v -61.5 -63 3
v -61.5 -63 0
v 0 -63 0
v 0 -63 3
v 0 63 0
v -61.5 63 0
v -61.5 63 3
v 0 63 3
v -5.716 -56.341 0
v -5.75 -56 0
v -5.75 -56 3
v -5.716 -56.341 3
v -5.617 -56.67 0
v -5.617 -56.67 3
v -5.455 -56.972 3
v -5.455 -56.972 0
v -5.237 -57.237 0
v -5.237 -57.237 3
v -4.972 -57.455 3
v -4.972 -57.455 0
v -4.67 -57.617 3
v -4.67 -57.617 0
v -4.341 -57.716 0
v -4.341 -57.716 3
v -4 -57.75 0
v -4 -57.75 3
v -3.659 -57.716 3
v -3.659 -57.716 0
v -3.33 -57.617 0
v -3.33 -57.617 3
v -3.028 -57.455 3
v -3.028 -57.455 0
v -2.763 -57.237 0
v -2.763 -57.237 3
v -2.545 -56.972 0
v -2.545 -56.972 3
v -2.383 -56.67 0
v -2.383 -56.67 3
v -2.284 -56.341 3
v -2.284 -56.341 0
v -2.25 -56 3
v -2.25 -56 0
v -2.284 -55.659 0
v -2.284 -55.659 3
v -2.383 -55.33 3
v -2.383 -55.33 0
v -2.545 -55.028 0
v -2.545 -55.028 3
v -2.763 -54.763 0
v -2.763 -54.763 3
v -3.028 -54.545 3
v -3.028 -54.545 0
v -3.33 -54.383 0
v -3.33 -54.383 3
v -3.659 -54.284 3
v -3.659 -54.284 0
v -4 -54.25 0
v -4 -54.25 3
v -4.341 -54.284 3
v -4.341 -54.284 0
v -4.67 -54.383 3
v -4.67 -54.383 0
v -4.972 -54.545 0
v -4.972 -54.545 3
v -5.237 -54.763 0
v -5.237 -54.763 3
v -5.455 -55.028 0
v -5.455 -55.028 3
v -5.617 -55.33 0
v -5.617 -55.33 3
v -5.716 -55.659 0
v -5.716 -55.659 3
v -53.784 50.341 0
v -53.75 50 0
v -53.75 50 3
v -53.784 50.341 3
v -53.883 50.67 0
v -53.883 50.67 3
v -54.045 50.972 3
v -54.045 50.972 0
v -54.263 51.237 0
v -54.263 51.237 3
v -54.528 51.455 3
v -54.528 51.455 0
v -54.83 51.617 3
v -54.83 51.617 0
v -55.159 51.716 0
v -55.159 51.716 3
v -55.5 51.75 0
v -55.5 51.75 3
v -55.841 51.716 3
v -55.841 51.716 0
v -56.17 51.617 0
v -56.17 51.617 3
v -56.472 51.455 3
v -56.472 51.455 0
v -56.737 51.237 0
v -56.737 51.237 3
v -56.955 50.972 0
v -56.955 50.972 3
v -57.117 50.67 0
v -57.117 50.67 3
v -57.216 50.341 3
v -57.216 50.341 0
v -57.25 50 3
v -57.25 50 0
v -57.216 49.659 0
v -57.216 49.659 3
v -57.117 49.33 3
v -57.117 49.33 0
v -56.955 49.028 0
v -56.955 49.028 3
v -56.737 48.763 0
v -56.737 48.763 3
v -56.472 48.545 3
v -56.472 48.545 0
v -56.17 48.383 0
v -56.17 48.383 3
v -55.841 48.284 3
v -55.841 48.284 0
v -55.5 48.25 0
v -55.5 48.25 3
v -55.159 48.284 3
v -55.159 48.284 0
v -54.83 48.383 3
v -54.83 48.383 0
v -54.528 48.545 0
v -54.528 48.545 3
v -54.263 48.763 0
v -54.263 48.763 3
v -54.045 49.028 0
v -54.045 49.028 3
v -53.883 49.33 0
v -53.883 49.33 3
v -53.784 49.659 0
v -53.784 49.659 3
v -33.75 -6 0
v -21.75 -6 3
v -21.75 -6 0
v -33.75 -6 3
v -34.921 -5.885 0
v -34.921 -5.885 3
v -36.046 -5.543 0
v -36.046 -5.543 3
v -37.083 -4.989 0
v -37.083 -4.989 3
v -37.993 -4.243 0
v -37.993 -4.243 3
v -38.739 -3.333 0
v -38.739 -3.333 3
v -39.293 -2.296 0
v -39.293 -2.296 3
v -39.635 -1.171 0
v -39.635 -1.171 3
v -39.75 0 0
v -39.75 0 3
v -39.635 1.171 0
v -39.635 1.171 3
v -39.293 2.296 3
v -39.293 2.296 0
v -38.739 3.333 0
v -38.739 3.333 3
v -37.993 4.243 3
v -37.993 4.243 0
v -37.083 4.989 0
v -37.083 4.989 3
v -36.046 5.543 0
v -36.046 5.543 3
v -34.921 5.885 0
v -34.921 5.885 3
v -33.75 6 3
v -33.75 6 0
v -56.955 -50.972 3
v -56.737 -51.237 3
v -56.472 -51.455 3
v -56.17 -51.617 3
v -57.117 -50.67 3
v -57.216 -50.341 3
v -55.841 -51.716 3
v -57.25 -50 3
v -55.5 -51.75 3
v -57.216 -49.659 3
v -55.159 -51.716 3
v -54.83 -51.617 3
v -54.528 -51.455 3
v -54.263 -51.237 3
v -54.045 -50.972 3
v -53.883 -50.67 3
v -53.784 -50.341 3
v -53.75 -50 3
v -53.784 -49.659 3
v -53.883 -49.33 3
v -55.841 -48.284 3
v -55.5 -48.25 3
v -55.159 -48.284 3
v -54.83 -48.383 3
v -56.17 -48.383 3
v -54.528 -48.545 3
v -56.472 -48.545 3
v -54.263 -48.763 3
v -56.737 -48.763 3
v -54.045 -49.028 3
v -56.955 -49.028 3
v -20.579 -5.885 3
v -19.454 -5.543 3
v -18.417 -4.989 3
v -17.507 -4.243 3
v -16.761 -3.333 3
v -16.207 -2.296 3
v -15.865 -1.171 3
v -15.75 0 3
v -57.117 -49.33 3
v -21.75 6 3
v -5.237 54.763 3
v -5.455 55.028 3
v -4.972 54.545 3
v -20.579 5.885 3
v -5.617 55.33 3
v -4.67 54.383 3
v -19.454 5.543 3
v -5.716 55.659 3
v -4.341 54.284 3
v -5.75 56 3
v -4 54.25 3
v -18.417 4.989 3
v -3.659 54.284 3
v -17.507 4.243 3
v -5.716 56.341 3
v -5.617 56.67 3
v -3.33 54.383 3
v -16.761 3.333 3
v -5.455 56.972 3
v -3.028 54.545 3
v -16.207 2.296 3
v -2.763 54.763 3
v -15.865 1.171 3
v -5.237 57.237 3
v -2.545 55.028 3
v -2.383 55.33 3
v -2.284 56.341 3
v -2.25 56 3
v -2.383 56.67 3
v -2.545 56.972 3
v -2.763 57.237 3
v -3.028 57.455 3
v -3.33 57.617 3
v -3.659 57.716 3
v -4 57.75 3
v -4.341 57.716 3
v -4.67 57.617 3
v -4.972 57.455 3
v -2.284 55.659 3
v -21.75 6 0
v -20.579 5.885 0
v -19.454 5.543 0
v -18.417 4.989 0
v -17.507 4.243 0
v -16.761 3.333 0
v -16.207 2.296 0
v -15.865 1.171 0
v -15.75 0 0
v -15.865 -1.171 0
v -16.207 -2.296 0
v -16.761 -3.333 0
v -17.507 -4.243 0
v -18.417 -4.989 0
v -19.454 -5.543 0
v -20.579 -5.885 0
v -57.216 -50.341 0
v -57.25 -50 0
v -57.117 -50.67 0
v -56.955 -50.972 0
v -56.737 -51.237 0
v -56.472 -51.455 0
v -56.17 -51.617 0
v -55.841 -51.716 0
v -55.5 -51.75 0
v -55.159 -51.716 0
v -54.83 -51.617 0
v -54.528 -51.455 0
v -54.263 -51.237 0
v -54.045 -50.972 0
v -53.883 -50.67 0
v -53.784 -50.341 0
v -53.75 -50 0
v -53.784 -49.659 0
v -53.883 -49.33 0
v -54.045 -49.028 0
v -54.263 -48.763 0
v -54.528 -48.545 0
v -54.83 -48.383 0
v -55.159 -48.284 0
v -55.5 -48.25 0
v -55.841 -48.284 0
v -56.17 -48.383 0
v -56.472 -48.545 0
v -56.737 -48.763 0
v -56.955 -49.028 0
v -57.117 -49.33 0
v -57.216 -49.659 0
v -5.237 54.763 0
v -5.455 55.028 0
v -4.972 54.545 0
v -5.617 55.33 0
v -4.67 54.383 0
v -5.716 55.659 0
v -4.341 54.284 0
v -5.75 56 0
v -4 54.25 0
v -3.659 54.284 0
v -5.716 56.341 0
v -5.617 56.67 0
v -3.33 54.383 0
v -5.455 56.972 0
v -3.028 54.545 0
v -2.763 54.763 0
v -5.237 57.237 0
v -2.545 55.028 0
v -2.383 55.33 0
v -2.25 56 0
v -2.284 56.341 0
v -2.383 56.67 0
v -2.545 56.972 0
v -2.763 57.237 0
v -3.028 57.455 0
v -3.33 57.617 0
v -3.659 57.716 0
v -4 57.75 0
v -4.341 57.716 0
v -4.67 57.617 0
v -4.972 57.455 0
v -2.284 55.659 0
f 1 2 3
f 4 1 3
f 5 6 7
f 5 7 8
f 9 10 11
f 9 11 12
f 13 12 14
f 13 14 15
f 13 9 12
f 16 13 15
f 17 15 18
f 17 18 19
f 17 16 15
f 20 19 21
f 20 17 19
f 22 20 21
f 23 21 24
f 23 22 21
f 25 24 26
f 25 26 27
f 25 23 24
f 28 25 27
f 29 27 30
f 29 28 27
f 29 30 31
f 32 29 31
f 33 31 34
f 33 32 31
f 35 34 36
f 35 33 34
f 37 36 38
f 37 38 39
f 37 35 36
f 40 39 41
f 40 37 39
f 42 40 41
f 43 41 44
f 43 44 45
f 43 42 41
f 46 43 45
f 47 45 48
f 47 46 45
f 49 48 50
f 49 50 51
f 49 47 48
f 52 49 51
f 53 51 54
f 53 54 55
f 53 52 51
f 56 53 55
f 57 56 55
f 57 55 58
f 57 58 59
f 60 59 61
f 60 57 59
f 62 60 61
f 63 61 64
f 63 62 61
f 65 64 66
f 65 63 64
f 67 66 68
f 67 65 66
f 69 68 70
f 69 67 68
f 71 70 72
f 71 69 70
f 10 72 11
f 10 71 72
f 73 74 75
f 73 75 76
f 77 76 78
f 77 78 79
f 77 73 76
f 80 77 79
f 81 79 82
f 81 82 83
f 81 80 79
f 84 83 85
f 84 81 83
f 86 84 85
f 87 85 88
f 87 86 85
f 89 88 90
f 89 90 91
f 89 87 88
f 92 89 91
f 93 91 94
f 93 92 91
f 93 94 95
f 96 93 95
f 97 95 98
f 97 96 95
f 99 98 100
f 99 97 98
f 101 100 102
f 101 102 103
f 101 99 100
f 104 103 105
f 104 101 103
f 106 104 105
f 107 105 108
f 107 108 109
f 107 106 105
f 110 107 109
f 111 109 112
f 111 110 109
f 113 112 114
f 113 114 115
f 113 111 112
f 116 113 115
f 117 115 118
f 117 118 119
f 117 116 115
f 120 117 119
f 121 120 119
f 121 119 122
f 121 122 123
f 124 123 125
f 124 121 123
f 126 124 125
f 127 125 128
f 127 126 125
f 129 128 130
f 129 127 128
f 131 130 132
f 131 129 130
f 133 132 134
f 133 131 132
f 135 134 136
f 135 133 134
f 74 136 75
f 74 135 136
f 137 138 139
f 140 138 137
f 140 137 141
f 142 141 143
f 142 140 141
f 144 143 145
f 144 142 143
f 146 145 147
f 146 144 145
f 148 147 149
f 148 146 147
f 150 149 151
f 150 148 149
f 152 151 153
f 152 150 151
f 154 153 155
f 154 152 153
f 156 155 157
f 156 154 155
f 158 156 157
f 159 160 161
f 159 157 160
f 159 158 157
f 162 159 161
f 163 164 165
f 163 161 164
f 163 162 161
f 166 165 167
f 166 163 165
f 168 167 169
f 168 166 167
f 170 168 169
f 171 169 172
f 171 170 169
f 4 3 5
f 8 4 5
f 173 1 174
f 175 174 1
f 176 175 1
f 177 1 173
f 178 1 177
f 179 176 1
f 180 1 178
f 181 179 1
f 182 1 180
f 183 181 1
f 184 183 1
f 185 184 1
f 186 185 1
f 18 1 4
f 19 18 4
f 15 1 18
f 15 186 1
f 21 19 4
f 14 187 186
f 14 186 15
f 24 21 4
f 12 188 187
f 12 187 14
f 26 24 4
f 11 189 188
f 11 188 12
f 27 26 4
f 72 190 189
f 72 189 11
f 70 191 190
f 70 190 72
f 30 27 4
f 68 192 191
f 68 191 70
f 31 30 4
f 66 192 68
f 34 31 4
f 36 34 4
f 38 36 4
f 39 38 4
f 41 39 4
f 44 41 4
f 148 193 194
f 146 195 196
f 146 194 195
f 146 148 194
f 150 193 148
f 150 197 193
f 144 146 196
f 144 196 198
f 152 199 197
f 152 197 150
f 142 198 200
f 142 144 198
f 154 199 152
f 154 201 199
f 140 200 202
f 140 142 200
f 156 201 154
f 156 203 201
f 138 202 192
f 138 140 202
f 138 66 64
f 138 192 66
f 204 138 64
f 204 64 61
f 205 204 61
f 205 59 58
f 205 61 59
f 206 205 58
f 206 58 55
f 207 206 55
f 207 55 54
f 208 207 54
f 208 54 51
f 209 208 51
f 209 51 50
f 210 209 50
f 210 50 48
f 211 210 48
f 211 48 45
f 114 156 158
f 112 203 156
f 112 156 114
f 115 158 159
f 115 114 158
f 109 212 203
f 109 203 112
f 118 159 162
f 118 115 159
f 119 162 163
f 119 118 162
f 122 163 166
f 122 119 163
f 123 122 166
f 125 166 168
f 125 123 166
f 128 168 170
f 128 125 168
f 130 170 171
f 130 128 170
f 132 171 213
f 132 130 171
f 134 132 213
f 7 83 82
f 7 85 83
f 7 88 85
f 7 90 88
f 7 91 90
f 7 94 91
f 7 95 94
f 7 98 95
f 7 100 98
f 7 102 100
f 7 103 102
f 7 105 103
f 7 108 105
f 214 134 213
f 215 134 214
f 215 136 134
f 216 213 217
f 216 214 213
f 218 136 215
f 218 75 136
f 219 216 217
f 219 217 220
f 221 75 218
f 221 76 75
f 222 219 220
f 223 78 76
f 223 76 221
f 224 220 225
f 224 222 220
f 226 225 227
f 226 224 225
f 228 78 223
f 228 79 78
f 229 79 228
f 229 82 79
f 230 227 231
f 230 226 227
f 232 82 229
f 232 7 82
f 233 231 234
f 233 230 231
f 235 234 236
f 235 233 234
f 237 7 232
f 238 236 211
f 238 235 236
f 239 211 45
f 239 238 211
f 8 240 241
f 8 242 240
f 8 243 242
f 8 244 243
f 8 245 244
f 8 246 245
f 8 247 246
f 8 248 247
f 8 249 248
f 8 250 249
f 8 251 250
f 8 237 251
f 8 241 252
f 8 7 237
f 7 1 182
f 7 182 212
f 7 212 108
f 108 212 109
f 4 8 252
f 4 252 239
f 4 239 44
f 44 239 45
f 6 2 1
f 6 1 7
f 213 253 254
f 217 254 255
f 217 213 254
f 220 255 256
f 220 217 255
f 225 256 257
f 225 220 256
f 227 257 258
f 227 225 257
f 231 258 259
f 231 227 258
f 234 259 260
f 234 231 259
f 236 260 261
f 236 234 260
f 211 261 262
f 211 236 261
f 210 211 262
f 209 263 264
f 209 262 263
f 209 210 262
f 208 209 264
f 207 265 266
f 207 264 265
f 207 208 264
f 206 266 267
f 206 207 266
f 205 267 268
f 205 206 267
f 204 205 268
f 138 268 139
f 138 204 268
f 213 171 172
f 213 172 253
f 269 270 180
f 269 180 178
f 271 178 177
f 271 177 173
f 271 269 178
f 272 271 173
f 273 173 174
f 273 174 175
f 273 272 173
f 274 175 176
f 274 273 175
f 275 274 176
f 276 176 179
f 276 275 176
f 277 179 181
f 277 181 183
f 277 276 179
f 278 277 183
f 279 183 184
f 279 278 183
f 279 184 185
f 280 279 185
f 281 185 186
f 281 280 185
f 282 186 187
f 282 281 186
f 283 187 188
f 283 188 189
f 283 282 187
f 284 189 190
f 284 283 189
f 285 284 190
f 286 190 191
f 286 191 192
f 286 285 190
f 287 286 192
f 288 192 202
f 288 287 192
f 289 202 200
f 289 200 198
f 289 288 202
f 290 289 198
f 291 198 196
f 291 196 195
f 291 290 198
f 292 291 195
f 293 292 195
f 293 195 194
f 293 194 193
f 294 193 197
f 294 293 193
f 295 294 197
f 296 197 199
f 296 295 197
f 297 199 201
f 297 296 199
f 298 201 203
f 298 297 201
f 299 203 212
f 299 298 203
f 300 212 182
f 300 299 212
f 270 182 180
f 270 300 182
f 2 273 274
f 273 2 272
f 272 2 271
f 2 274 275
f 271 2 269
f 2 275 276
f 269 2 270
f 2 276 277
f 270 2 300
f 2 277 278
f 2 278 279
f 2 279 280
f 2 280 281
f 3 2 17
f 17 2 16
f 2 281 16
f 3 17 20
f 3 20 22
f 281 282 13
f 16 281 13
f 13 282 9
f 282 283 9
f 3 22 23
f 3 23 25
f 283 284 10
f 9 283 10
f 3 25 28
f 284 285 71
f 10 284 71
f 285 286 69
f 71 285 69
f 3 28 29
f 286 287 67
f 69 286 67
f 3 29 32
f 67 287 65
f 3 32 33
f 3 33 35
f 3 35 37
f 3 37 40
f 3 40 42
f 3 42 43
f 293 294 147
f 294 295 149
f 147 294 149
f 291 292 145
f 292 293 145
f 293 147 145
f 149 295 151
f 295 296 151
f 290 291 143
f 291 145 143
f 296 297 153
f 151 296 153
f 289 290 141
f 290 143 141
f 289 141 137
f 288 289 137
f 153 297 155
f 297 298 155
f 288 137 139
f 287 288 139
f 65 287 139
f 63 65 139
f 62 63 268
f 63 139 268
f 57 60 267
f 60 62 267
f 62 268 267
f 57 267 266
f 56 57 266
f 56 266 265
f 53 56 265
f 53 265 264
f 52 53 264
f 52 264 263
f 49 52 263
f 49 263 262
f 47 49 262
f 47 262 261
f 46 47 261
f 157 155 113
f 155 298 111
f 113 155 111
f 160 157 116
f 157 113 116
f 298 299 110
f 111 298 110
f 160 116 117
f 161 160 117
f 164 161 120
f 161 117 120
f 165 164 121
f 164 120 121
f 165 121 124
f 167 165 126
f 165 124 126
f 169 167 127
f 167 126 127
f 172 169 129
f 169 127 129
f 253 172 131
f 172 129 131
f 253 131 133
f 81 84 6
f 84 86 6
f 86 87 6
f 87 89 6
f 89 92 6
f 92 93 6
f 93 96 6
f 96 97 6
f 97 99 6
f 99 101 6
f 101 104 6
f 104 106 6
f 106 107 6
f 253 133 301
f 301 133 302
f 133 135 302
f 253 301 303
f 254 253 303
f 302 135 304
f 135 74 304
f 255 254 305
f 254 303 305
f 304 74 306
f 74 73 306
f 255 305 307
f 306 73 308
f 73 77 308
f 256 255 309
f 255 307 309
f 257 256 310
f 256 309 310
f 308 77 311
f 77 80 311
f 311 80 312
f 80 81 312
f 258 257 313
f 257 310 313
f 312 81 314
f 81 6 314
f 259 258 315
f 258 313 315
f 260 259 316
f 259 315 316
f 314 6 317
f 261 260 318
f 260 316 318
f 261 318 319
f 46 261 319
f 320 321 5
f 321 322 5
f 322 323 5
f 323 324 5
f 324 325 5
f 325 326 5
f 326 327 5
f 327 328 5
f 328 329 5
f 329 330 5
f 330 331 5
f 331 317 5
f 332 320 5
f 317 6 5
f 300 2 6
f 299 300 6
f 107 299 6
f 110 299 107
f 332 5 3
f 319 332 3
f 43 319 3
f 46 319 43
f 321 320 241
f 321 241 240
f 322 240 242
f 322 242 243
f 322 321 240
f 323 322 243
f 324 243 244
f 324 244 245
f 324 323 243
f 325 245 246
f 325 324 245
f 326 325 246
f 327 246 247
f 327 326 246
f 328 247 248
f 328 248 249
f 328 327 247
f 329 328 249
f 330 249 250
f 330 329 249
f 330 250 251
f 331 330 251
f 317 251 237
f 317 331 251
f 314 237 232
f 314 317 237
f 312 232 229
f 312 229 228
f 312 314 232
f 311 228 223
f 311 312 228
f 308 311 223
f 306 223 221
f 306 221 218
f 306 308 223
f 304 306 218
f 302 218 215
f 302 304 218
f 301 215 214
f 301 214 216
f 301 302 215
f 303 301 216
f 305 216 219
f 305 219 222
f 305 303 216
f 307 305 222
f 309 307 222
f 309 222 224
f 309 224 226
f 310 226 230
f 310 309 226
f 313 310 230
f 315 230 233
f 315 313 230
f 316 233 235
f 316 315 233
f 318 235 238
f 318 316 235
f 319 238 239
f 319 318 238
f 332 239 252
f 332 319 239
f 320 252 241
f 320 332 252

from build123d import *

# Parameters (mm, degrees)
SKETCH1_W           = 61.5
SKETCH1_H           = 126
SKETCH1_R           = 1.75
BOSS_EXTRUDE1_DEPTH = 3
CUT_EXTRUDE1_REACH  = 90.092


with BuildPart() as part:
    # Sketch1 → Boss-Extrude1 (new body)
    with BuildSketch(Plane.XY):
        with Locations((-30.75, 0)):
            Rectangle(SKETCH1_W, SKETCH1_H)
        with Locations((-4, 56)):
            Circle(SKETCH1_R, mode=Mode.SUBTRACT)
        with Locations((-55.5, 50)):
            Circle(SKETCH1_R, mode=Mode.SUBTRACT)
        with Locations(Location((-4, -56, 0), (0, 0, 180))):
            Circle(SKETCH1_R, mode=Mode.SUBTRACT)
        with Locations(Location((-55.5, -50, 0), (0, 0, 180))):
            Circle(SKETCH1_R, mode=Mode.SUBTRACT)
    extrude(amount=BOSS_EXTRUDE1_DEPTH)

    # Sketch2 → Cut-Extrude1 (cut, up to next)
    with BuildSketch(Plane.XY.offset(3), mode=Mode.PRIVATE) as cut_extrude1_sk1:
        with BuildLine():
            Line((-33.75, 6), (-21.75, 6))
            ThreePointArc((-21.75, 6), (-15.75, 0), (-21.75, -6))
            Line((-21.75, -6), (-33.75, -6))
            ThreePointArc((-33.75, -6), (-39.75, 0), (-33.75, 6))
        make_face()
    cut_extrude1_tool1 = extrude(cut_extrude1_sk1.sketch, amount=-CUT_EXTRUDE1_REACH, mode=Mode.PRIVATE) & part.part
    add(cut_extrude1_tool1.solids().sort_by_distance((-27.75, 0, 3))[0], mode=Mode.SUBTRACT)


solid = part.part
